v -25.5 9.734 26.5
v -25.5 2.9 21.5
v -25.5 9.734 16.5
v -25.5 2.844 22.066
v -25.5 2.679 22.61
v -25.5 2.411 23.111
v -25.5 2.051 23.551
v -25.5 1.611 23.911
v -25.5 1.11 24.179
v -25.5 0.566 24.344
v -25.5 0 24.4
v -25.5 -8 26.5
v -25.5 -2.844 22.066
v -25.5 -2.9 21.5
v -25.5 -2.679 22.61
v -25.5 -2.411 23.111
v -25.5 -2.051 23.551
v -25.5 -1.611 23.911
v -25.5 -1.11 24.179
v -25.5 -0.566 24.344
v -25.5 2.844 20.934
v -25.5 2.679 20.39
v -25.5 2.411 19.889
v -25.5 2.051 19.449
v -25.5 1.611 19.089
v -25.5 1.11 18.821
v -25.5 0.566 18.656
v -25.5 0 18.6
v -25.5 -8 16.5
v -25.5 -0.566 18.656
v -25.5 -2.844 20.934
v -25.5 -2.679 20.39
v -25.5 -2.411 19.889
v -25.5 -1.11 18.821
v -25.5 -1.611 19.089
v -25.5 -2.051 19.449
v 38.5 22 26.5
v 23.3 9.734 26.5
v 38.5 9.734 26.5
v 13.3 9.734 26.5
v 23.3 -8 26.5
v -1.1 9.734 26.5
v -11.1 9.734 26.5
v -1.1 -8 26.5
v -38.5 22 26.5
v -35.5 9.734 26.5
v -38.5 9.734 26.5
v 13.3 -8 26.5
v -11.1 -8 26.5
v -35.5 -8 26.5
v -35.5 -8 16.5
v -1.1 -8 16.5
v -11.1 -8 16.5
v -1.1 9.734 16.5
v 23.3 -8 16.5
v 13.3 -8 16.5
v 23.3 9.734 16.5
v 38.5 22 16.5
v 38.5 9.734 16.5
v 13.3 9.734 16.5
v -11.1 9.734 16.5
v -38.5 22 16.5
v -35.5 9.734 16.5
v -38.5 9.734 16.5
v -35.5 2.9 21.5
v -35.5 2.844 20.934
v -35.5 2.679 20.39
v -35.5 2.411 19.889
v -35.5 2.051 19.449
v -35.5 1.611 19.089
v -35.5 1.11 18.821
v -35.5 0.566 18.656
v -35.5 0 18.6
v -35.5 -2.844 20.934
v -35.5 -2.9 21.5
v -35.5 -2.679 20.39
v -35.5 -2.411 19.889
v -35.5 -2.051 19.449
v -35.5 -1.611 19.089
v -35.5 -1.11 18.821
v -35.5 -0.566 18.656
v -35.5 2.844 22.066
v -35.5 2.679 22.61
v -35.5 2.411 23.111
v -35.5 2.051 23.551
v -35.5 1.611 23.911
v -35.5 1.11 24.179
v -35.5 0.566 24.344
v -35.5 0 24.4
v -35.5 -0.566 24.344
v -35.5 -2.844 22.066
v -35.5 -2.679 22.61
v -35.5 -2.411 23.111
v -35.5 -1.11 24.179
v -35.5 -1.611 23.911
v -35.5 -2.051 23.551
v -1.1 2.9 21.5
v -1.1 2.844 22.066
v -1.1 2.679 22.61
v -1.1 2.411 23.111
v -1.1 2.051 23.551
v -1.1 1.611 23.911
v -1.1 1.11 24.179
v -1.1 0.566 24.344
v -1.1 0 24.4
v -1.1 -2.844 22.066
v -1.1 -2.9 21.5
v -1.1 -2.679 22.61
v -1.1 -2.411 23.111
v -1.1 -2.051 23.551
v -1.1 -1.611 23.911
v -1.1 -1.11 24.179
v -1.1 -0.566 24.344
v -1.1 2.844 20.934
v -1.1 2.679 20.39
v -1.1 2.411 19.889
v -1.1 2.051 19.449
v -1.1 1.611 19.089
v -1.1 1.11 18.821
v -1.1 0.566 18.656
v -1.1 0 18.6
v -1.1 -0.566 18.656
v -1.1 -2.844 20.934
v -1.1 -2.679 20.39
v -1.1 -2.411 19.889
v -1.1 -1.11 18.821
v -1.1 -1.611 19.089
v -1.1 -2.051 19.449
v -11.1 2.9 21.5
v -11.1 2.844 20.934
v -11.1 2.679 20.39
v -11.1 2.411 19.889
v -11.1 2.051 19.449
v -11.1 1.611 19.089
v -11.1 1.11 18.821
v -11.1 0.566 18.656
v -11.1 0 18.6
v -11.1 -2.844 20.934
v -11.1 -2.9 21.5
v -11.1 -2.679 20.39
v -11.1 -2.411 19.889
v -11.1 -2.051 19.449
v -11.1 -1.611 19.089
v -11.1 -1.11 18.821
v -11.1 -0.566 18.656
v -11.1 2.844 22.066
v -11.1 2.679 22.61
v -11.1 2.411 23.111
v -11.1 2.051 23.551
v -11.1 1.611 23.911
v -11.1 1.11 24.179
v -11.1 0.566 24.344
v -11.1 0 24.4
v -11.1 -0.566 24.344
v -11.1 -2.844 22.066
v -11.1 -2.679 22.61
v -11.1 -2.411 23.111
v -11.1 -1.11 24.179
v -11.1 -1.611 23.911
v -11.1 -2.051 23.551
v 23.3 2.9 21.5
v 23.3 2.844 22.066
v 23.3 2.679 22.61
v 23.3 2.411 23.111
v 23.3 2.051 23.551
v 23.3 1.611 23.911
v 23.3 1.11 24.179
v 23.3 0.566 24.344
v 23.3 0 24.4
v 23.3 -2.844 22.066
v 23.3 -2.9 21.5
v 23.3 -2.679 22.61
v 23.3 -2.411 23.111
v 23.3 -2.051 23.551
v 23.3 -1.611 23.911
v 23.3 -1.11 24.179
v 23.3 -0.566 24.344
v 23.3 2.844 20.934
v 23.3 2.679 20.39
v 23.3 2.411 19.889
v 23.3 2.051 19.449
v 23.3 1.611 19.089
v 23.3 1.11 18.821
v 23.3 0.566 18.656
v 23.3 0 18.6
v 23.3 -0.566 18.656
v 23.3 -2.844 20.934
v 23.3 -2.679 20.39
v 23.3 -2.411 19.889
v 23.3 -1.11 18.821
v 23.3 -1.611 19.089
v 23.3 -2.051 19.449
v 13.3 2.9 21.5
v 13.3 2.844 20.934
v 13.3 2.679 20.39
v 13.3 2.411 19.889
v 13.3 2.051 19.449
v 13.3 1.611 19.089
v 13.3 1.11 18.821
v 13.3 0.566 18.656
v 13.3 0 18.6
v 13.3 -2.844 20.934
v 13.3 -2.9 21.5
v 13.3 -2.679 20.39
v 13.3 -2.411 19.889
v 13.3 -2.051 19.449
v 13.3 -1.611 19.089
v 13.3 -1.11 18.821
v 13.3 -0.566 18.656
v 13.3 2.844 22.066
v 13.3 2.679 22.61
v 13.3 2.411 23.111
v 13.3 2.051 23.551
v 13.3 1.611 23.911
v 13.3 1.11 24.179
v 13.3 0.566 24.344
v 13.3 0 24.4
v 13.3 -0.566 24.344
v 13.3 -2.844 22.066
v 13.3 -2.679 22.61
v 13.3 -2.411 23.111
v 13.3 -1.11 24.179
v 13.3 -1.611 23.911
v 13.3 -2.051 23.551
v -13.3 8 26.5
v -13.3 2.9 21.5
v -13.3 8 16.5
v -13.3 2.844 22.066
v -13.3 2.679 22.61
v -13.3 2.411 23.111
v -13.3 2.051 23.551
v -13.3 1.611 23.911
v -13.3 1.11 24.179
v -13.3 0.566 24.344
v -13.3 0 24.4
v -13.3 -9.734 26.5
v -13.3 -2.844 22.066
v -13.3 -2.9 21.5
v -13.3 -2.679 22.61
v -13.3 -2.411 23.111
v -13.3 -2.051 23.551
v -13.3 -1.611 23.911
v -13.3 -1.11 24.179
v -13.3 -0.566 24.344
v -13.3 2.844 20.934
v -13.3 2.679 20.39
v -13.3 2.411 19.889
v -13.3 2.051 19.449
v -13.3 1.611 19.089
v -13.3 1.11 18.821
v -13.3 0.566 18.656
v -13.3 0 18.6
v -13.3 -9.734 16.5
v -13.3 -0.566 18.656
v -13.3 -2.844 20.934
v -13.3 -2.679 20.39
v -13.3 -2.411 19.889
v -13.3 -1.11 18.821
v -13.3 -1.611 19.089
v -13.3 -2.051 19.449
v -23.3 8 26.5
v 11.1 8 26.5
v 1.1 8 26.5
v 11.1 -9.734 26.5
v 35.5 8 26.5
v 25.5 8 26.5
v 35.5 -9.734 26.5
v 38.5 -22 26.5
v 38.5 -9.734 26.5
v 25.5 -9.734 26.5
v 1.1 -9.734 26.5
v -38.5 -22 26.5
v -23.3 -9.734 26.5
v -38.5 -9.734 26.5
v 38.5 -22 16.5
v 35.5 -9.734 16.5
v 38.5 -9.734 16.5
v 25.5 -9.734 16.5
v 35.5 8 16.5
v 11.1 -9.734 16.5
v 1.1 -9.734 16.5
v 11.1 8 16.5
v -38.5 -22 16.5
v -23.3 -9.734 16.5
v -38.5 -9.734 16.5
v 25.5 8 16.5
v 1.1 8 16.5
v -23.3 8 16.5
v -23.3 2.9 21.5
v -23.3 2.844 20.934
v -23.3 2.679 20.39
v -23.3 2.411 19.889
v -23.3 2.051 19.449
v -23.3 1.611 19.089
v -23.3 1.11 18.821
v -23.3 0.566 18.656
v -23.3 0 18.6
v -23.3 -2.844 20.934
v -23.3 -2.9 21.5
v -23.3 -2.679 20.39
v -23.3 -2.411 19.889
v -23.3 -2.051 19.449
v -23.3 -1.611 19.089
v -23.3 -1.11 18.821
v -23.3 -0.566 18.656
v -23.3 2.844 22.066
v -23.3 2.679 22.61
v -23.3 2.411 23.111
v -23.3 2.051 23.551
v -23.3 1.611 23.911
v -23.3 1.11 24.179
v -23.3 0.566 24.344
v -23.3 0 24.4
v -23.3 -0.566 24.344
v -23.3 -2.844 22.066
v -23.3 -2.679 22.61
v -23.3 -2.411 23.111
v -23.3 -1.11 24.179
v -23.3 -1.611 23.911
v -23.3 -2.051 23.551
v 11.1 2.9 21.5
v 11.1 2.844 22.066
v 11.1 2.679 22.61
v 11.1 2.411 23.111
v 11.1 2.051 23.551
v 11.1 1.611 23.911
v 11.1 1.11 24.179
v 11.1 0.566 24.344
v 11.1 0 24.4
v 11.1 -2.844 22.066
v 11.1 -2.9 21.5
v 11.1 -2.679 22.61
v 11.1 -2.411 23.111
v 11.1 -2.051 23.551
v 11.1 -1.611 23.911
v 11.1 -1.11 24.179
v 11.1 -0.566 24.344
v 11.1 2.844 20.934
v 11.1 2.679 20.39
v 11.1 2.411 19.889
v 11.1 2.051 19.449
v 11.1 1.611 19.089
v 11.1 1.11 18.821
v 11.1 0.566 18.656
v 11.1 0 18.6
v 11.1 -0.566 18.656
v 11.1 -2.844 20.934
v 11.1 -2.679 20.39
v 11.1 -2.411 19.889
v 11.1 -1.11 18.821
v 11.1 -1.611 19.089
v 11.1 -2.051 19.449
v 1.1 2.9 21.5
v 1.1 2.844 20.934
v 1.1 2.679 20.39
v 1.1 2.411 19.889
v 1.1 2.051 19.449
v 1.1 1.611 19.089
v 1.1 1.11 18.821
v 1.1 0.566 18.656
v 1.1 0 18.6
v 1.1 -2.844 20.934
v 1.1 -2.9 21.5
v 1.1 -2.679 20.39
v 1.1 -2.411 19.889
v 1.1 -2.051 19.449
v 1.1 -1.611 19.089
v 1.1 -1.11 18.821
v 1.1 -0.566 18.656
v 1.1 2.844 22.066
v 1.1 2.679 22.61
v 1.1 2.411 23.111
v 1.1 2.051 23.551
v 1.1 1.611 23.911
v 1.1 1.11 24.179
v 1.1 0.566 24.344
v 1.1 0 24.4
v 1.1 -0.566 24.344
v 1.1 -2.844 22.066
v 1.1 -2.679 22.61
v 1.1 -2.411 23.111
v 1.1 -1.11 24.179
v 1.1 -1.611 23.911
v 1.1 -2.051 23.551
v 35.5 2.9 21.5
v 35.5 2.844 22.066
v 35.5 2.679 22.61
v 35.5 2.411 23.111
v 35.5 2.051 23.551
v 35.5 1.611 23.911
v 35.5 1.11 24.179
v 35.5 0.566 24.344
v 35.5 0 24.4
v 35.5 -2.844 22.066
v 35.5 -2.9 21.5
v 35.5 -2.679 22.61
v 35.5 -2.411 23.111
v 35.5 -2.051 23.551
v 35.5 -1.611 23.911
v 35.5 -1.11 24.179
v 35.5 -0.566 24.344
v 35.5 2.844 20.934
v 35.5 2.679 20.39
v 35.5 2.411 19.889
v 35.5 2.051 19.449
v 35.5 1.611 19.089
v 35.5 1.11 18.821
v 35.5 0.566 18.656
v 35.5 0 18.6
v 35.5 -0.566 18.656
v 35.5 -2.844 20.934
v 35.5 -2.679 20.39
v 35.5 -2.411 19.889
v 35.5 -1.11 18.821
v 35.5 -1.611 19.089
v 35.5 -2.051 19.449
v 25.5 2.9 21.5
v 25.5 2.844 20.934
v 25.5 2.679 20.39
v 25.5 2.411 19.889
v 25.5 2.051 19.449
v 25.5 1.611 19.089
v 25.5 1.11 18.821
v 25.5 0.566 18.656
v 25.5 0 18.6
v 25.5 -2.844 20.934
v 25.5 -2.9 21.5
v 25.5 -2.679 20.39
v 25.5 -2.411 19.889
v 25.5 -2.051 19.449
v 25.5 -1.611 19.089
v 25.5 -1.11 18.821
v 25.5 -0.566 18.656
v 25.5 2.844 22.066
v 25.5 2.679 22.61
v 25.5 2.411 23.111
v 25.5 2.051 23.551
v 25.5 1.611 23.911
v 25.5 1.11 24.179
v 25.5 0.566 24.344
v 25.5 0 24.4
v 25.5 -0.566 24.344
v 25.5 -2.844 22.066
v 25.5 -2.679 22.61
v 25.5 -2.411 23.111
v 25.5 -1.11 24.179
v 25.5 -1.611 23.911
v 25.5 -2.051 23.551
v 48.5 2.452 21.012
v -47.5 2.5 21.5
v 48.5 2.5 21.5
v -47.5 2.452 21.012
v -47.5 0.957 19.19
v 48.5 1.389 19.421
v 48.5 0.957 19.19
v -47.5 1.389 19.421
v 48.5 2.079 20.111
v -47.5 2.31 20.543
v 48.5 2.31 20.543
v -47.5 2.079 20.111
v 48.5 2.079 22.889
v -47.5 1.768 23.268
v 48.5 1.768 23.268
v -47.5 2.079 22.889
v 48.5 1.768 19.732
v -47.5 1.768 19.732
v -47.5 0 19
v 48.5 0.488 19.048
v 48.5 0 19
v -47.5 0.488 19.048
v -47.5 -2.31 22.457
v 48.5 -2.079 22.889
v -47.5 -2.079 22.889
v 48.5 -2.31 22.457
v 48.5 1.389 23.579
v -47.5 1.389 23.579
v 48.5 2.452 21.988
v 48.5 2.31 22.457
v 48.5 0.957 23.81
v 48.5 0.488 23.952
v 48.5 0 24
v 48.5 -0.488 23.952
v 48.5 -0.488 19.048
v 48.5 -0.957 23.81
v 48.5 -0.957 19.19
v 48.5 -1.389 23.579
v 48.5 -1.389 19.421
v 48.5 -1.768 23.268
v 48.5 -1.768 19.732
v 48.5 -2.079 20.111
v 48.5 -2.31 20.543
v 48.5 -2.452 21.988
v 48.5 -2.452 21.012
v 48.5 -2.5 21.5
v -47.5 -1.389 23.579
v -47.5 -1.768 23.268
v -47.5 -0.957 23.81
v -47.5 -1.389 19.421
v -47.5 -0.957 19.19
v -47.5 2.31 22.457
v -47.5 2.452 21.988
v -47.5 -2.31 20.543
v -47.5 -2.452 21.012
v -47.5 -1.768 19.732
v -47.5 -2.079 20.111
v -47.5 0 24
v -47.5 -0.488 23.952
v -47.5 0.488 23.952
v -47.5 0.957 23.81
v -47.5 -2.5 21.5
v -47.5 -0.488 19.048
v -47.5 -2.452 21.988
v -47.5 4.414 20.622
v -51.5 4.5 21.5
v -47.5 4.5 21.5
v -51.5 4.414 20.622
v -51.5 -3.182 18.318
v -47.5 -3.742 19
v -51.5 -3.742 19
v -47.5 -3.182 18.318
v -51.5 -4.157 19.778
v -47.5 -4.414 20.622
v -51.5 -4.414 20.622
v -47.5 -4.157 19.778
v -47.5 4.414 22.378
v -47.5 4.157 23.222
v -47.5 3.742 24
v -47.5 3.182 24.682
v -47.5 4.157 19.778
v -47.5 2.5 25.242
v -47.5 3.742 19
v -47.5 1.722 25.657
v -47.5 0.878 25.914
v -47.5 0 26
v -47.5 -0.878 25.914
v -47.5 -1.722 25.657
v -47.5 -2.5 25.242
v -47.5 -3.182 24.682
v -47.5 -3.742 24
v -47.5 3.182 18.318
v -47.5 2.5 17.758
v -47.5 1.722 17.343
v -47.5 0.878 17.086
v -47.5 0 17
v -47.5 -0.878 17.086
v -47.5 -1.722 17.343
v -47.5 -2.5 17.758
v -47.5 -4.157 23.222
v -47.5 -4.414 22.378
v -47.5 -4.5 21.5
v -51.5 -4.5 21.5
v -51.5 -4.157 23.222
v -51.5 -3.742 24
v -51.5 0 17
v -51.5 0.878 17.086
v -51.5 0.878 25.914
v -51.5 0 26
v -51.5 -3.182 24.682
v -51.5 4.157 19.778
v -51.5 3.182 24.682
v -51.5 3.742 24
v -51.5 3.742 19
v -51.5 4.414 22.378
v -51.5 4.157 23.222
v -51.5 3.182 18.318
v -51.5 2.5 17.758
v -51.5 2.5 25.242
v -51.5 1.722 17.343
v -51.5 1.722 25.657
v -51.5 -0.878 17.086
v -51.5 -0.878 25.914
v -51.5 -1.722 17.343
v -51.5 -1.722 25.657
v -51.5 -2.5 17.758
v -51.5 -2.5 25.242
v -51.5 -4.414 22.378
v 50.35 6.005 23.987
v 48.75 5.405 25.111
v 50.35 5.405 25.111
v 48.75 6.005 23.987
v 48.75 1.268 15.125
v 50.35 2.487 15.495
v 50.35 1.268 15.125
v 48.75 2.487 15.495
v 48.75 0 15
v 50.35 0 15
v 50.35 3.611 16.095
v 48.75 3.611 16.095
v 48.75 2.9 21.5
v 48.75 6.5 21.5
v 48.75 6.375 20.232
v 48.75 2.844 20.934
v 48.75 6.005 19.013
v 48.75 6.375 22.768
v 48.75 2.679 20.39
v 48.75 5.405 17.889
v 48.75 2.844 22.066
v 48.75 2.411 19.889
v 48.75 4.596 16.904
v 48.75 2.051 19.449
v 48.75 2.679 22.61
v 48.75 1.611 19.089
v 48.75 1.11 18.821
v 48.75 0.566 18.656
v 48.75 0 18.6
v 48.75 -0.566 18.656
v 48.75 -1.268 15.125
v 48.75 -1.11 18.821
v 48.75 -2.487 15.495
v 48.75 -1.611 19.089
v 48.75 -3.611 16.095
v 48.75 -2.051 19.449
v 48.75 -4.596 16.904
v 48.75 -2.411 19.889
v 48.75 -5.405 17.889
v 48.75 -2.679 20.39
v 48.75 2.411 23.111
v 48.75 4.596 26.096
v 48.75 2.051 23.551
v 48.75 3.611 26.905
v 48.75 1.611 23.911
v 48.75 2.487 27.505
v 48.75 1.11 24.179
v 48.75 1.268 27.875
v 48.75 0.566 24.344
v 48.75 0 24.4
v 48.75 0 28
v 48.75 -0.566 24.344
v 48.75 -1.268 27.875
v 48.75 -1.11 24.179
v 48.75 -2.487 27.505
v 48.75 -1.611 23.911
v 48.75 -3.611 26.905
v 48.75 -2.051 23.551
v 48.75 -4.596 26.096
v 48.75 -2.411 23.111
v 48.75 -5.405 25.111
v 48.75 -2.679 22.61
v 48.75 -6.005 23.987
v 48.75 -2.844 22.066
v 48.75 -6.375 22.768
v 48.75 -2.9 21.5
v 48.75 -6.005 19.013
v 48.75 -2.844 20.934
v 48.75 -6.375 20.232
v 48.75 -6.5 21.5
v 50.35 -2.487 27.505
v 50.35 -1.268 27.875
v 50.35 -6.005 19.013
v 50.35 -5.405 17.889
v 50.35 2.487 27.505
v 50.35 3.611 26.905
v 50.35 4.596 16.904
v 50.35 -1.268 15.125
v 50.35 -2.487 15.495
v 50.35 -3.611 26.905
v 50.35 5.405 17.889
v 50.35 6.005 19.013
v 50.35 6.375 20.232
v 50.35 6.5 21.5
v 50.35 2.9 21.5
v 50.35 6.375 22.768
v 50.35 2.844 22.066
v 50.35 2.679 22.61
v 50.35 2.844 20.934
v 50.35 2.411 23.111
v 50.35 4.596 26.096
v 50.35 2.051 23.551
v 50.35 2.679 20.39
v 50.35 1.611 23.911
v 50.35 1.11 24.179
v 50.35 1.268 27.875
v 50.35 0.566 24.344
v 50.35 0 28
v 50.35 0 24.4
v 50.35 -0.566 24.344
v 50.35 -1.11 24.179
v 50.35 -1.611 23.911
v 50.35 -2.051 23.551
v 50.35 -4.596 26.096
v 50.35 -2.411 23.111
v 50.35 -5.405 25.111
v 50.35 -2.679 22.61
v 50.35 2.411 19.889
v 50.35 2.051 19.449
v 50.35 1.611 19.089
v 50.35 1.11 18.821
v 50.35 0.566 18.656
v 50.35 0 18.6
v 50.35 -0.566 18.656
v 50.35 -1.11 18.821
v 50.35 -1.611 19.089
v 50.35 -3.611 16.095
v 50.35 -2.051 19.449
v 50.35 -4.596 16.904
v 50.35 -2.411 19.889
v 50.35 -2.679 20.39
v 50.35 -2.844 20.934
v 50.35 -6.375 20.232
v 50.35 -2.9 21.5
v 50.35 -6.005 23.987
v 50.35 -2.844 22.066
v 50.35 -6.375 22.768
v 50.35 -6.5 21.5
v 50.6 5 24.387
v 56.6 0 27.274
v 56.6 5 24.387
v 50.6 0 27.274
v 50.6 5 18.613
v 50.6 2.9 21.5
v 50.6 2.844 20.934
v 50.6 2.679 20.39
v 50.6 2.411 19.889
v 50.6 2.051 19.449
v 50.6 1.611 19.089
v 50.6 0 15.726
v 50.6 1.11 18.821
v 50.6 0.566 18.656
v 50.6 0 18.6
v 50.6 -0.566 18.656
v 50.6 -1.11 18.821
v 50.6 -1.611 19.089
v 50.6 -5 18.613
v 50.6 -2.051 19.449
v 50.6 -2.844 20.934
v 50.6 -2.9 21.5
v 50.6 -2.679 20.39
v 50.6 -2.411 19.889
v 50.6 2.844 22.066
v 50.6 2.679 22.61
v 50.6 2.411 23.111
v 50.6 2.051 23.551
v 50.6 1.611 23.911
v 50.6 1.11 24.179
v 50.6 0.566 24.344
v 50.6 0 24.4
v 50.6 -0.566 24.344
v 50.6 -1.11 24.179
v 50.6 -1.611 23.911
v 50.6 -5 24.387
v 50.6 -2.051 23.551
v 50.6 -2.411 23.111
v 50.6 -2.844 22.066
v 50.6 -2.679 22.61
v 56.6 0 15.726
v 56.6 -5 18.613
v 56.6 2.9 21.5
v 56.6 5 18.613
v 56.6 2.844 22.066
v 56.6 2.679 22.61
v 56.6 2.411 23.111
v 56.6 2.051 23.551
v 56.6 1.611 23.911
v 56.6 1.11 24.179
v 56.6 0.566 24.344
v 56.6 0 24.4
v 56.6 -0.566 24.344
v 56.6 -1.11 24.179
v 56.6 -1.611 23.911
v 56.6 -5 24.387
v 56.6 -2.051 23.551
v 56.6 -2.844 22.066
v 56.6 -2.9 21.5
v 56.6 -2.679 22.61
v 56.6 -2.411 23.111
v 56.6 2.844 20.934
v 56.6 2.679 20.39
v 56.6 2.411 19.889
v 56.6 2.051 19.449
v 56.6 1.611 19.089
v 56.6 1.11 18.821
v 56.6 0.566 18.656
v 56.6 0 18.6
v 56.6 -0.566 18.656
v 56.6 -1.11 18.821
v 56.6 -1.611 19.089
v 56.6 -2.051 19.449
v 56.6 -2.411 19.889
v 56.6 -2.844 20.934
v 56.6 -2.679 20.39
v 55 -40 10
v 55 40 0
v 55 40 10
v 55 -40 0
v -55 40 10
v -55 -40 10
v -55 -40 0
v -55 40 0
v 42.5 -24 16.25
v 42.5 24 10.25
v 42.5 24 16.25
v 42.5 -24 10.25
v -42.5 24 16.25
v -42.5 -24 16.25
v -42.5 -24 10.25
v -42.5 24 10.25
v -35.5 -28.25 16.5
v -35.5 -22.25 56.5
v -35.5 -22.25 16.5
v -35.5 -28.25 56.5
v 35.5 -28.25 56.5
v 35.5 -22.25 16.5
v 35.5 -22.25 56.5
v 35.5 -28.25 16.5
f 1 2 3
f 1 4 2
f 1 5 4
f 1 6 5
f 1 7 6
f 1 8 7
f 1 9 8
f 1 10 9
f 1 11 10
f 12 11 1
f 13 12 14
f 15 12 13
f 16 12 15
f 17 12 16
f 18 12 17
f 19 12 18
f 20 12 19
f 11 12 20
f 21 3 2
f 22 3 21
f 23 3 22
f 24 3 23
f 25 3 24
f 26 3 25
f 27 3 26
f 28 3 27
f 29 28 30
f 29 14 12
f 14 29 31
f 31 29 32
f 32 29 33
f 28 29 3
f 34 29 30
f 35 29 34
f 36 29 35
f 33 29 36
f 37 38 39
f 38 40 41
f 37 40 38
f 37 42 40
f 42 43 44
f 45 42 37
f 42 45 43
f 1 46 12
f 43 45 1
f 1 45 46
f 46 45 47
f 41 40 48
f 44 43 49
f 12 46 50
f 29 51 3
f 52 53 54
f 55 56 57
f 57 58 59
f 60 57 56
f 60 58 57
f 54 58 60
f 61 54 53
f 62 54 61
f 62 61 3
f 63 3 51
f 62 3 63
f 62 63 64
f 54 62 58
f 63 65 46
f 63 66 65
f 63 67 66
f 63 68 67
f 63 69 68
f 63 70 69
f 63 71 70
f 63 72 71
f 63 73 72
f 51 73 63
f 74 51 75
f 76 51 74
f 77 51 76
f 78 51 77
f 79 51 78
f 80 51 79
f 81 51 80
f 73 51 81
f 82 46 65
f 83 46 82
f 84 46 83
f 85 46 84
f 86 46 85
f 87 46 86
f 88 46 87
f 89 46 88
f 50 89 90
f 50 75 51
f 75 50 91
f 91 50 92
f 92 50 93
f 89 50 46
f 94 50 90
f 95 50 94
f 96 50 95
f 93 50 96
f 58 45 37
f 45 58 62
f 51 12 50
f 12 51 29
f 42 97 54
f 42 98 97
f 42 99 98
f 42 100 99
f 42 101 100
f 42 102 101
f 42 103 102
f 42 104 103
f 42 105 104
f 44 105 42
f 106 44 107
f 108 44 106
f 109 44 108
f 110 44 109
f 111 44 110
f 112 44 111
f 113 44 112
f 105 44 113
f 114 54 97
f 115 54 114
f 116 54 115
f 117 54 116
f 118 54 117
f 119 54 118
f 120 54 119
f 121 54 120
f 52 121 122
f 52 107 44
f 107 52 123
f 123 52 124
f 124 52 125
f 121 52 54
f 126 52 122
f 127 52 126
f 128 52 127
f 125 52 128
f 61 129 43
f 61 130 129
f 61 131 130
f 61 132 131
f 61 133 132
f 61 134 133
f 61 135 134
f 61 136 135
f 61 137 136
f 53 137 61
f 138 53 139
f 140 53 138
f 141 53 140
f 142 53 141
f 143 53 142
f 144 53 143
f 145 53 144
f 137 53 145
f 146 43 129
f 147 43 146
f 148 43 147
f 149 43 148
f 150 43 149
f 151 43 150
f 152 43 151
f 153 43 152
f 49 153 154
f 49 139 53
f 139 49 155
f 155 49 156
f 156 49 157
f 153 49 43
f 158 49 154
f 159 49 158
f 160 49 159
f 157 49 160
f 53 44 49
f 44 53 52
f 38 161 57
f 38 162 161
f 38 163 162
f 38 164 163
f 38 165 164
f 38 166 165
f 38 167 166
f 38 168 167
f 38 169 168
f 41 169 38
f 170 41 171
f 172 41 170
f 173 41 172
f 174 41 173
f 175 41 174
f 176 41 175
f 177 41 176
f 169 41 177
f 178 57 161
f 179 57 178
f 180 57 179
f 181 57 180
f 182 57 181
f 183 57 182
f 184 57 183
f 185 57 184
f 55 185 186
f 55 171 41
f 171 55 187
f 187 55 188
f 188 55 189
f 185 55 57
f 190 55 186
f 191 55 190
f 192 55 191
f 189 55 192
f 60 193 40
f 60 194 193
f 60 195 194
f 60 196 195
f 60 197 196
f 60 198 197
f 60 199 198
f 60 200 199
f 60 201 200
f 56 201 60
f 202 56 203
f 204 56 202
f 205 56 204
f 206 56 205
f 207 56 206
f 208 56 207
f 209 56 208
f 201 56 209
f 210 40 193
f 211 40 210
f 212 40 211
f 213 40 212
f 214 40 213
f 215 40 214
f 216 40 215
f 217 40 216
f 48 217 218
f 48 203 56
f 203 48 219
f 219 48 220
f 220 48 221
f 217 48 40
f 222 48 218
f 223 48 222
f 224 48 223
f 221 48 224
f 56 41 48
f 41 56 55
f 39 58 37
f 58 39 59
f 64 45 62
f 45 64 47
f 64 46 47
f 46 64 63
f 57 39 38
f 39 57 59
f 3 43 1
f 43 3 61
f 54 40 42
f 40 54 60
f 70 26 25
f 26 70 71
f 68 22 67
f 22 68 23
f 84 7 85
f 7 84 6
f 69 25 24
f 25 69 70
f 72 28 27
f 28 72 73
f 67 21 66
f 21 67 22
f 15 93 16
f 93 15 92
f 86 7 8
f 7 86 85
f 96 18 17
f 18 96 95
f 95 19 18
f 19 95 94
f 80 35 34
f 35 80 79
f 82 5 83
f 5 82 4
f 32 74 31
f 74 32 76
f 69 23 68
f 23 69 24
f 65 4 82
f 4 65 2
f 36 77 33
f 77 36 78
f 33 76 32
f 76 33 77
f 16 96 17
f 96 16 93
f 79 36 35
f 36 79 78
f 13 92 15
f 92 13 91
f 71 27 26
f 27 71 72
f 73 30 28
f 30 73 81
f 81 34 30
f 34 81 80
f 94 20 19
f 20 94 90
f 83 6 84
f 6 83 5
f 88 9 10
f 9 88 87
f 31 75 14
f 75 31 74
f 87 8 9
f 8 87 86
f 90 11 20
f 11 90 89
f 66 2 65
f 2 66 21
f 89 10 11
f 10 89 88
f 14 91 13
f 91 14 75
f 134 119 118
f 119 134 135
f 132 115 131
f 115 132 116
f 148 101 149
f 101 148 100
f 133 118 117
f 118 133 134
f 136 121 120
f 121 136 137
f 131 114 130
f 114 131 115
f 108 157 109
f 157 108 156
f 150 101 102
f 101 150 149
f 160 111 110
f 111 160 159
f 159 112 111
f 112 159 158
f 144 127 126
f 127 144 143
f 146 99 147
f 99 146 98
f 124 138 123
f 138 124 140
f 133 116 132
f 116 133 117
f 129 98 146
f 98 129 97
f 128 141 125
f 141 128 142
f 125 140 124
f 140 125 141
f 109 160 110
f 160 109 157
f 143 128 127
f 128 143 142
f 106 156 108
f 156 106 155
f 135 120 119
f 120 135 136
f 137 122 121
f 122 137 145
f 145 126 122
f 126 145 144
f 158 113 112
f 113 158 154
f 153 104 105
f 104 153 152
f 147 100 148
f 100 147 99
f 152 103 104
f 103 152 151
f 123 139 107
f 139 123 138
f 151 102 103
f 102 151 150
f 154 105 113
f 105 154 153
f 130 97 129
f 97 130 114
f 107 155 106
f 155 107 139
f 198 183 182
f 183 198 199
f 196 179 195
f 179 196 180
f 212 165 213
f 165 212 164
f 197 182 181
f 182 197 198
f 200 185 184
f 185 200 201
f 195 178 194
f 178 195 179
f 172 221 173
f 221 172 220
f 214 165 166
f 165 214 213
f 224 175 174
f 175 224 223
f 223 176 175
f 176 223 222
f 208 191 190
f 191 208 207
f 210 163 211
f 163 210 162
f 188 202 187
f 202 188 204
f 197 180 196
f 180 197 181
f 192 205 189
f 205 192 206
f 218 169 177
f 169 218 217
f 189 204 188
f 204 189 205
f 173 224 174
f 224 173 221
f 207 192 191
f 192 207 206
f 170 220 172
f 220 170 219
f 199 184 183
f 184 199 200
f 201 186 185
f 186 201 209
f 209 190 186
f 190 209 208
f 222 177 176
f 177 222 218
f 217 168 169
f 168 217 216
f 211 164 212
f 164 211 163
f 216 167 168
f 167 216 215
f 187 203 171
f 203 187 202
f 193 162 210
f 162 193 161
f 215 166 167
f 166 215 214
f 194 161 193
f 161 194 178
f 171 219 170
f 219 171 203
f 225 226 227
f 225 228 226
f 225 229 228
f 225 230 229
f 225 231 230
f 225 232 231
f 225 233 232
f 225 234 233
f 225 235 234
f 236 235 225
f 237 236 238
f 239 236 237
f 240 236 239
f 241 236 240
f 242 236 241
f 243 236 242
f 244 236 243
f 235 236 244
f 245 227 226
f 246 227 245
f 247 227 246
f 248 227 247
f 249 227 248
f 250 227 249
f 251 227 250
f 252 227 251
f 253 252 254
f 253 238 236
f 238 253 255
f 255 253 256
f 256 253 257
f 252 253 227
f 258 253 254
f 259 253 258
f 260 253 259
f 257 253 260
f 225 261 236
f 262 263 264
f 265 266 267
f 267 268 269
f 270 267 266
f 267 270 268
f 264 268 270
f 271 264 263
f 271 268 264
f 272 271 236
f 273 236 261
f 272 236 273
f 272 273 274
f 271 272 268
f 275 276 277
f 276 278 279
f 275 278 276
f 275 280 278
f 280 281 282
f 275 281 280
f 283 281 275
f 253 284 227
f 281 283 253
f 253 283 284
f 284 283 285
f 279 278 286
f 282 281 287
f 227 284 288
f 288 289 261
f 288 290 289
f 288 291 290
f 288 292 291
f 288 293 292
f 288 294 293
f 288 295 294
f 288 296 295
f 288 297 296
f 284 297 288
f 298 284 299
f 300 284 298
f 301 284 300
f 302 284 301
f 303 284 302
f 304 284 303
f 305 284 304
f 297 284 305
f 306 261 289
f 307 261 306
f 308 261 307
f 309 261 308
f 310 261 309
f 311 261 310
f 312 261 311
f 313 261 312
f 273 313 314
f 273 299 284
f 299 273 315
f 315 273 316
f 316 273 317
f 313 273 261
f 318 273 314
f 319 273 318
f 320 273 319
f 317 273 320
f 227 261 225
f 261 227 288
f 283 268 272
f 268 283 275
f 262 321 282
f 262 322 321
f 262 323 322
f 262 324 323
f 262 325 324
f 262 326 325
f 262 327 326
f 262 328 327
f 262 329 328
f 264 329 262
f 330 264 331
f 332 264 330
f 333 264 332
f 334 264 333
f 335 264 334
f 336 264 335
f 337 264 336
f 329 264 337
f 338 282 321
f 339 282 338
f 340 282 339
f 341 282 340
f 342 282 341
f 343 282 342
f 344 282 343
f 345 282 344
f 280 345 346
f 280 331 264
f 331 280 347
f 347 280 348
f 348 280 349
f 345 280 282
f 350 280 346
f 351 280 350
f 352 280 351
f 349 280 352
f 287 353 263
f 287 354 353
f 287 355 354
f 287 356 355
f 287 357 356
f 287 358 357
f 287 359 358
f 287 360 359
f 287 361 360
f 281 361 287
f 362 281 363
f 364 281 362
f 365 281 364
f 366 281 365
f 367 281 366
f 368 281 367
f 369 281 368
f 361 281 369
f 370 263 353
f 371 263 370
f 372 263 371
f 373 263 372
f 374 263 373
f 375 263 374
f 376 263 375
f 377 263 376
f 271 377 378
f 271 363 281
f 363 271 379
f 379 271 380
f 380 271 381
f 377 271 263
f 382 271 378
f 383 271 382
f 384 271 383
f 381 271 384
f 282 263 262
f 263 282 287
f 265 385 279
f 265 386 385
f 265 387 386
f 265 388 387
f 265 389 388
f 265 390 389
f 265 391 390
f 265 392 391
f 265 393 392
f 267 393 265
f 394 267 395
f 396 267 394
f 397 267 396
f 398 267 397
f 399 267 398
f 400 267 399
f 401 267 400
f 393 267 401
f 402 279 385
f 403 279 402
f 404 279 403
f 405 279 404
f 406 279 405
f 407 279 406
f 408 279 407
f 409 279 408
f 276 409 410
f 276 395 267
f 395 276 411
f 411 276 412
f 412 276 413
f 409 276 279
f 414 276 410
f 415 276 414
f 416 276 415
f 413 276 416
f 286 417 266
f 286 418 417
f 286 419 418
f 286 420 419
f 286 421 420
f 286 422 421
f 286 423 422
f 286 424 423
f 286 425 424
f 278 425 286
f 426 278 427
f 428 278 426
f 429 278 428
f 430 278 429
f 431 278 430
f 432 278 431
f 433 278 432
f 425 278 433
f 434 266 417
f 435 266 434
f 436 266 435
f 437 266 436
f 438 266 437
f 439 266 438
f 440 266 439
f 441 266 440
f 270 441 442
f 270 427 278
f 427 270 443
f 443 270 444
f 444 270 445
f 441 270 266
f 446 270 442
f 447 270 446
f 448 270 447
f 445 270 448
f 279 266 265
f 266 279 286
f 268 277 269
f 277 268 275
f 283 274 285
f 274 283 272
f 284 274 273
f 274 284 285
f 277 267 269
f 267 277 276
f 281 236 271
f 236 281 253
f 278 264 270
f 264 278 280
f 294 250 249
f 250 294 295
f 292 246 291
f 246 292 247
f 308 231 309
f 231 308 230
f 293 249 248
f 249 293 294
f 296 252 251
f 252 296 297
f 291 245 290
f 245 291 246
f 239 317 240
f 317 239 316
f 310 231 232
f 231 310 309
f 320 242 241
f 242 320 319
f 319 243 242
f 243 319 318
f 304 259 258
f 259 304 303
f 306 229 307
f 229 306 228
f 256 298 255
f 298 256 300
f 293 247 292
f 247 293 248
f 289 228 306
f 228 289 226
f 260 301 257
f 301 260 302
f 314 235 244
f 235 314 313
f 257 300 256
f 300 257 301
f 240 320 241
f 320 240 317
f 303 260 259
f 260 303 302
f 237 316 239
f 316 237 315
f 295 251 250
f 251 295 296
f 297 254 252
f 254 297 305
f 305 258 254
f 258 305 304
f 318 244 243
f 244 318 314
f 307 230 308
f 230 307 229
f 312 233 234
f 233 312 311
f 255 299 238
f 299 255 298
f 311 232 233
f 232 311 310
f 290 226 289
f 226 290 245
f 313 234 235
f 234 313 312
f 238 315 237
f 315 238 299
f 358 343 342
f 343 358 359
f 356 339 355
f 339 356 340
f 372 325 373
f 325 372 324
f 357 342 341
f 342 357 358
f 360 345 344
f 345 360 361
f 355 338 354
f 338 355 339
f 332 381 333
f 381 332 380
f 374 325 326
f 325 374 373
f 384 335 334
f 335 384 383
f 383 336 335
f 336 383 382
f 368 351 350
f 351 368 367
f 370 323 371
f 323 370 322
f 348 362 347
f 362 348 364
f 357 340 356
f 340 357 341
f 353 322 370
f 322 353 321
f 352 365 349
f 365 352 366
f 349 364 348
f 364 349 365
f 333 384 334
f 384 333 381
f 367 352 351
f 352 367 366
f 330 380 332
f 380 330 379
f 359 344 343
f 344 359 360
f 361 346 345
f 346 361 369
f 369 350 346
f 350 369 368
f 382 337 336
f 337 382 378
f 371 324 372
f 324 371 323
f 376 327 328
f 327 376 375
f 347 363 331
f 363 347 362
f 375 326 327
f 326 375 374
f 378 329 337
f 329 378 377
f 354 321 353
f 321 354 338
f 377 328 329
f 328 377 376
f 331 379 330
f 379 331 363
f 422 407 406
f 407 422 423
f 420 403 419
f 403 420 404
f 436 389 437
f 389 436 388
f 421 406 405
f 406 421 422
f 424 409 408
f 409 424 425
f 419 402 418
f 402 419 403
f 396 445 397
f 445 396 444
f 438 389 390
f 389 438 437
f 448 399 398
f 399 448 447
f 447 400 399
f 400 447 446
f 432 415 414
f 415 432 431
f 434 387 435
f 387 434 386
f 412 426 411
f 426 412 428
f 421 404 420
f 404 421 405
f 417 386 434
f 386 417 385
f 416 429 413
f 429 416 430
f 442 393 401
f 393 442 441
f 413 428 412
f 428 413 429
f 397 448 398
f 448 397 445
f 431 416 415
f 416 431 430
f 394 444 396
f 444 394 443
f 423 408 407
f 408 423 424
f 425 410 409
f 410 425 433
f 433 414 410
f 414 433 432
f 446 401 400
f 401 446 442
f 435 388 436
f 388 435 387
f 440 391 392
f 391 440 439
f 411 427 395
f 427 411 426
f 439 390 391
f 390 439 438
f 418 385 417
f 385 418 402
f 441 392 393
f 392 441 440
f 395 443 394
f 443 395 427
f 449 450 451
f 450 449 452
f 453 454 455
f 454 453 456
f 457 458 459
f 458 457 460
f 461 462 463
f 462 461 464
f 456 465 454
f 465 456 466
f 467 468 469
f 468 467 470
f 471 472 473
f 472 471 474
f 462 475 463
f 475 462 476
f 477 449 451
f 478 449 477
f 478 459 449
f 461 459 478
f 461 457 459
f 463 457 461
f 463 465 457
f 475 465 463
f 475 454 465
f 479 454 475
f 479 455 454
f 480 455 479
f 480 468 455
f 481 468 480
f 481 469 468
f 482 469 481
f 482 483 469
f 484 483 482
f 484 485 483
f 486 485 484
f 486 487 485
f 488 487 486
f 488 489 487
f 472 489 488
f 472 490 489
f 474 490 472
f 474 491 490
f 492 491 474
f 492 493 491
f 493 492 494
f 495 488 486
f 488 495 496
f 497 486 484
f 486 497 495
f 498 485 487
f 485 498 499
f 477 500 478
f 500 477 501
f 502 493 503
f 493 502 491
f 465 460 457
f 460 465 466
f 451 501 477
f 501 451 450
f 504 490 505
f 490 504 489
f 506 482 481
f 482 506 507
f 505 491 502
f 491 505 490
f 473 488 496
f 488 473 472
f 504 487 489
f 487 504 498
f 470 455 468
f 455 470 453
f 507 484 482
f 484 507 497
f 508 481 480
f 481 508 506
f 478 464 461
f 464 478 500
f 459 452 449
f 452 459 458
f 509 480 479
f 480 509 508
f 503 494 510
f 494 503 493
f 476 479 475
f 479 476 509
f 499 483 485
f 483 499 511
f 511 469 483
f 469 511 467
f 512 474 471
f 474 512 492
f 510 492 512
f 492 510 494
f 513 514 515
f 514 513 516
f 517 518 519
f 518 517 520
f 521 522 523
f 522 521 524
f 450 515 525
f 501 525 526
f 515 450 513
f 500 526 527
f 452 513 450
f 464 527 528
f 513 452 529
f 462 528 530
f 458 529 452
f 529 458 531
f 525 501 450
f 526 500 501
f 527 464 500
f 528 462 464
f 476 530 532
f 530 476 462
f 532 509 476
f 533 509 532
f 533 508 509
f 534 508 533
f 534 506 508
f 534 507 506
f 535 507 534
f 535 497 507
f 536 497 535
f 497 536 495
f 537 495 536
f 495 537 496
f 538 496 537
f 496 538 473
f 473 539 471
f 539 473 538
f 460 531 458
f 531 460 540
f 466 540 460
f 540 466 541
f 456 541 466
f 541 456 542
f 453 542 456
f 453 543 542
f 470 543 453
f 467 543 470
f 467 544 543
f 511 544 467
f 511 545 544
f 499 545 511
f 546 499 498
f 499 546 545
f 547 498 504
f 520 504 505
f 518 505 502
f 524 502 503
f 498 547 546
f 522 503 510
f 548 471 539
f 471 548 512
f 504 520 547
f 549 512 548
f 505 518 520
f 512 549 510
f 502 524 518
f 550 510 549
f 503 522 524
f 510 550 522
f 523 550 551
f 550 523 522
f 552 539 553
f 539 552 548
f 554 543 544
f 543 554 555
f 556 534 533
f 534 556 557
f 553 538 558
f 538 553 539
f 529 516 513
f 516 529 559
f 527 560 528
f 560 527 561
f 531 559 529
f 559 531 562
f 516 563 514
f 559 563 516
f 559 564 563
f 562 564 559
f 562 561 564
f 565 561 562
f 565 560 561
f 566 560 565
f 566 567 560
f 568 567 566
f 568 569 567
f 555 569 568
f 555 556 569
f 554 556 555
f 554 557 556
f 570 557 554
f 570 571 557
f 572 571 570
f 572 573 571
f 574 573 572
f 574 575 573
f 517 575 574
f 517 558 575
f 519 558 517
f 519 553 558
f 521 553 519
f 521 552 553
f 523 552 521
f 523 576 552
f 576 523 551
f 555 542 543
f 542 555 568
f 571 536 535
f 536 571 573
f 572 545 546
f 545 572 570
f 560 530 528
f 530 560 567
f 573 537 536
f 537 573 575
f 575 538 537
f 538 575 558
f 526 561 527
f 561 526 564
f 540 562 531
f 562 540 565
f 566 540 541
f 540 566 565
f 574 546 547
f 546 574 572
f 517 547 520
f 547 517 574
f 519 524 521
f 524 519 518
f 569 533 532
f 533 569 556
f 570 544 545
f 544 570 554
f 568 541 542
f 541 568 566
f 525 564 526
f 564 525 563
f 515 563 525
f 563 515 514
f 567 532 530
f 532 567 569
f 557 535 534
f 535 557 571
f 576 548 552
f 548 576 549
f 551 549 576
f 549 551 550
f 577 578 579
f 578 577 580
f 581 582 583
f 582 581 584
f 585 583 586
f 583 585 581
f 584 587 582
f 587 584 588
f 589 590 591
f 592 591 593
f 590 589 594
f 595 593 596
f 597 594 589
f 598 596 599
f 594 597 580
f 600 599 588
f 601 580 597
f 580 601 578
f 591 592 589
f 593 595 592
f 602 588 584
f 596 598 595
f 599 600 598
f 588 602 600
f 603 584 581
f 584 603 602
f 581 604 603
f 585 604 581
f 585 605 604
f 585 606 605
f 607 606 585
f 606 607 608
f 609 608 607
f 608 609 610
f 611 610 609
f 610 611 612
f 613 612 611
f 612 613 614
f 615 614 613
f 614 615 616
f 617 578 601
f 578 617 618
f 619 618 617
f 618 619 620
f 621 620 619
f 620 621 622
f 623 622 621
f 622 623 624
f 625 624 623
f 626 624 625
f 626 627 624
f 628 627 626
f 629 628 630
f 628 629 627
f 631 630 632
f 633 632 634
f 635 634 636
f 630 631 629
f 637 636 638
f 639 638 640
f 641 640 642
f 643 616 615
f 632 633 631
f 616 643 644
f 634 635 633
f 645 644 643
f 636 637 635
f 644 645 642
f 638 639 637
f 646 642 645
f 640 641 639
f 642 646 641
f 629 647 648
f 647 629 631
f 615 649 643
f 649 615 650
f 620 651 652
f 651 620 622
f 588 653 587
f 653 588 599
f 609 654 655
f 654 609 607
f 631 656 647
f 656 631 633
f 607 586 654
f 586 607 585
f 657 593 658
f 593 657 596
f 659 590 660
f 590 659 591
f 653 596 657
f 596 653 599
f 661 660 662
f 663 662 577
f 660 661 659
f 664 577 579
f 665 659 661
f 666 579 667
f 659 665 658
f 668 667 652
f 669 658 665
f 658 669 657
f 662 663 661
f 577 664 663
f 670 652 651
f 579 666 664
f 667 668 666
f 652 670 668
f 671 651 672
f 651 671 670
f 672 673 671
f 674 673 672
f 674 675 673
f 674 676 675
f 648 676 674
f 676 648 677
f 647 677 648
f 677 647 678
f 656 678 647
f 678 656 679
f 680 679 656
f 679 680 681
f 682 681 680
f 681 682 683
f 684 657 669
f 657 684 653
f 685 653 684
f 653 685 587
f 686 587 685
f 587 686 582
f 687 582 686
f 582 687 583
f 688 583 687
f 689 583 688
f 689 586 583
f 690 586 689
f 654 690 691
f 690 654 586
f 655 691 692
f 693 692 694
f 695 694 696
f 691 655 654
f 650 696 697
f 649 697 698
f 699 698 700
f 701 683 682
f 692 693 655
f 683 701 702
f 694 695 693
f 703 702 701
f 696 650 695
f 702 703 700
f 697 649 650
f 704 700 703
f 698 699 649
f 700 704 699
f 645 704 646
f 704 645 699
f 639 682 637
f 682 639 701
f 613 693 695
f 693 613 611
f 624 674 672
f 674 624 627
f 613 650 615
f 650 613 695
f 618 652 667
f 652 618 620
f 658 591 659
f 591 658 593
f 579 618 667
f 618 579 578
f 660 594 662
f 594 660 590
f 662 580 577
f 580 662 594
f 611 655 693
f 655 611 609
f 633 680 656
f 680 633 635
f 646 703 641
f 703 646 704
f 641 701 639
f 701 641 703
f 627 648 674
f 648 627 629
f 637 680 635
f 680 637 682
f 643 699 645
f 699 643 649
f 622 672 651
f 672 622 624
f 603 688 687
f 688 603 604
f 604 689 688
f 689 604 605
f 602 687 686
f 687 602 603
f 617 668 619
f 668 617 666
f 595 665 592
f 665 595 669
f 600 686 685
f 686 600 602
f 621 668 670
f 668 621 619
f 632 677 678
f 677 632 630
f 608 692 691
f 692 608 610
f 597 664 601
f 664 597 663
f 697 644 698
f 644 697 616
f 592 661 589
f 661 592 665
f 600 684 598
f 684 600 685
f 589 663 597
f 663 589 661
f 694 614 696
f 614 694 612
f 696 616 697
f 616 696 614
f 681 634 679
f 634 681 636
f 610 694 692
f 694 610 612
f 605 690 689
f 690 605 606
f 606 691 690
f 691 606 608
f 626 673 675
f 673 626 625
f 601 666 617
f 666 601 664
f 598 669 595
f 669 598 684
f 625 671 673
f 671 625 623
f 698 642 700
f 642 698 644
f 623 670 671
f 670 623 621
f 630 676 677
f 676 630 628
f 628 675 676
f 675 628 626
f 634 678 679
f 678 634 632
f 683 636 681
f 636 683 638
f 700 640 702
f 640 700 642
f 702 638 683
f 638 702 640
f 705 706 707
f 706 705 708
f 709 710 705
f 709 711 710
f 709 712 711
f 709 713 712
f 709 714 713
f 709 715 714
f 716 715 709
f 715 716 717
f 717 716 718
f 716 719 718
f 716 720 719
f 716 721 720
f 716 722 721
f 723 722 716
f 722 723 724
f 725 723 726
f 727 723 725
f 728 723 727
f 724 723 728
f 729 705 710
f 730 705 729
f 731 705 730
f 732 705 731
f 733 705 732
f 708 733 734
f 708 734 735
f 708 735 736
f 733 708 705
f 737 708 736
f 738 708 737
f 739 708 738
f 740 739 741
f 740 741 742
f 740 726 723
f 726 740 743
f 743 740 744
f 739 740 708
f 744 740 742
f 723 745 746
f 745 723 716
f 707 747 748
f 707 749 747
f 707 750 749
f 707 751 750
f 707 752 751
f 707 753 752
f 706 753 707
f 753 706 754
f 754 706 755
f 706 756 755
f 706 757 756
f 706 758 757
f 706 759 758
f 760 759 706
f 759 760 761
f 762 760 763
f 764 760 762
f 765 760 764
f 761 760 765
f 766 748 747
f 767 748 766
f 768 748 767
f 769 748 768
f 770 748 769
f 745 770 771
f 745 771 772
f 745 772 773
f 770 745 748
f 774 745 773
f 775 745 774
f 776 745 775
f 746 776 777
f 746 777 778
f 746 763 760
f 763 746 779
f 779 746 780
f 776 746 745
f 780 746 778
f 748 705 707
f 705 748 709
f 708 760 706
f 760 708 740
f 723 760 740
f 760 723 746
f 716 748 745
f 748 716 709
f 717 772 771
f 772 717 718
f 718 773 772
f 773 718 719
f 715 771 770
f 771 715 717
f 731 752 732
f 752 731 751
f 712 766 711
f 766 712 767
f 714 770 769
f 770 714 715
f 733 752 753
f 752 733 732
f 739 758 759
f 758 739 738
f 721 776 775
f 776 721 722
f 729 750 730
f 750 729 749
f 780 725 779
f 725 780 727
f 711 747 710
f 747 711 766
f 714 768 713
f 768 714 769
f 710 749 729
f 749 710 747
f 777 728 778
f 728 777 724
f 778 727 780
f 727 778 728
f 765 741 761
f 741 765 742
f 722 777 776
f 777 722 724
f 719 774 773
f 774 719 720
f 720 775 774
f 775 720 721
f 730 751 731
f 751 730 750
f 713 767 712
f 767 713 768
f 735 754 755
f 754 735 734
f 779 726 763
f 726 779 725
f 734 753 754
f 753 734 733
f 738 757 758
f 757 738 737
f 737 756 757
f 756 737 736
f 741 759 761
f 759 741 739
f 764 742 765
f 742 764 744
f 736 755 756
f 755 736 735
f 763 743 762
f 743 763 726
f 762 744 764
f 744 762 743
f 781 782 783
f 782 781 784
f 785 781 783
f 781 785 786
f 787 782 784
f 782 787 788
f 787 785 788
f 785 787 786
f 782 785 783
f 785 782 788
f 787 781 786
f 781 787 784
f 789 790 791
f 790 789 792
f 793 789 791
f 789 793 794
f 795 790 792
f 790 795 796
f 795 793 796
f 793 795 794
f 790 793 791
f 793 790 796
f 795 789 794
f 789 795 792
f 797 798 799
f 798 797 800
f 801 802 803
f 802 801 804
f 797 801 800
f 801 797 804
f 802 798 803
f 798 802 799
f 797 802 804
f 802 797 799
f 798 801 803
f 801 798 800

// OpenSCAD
$fn = 32;

// ------------------------------------------------------------------------
// Comb hinge with flap: leaf 77 x 22 mm, pin d5, flap 40 mm
// Every part is its own module, assembly() places every instance.
// ------------------------------------------------------------------------

// --- part 1 ---
module hinge_bed() {
  difference() {
    translate([-55, -40, 0]) cube([110, 80, 10]);
  }
}

// --- part 2 ---
module hinge_riser() {
  difference() {
    translate([-42.5, -24, 0]) cube([85, 48, 6]);
  }
}

// --- part 3 ---
module hinge_leaf_a() {
  difference() {
    union() {
      translate([-35.5, -8, -5]) cube([10, 30, 10]);
      translate([-11.1, -8, -5]) cube([10, 30, 10]);
      translate([13.3, -8, -5]) cube([10, 30, 10]);
      translate([-38.5, 9.734, -5]) cube([77, 12.266, 10]);
    }
    translate([-30.5, 0, 0]) rotate([0, 90, 0]) cylinder(h = 12, d = 5.8, center = true);
    translate([-6.1, 0, 0]) rotate([0, 90, 0]) cylinder(h = 12, d = 5.8, center = true);
    translate([18.3, 0, 0]) rotate([0, 90, 0]) cylinder(h = 12, d = 5.8, center = true);
  }
}

// --- part 4 ---
module hinge_leaf_b() {
  difference() {
    union() {
      translate([-23.3, -22, -5]) cube([10, 30, 10]);
      translate([1.1, -22, -5]) cube([10, 30, 10]);
      translate([25.5, -22, -5]) cube([10, 30, 10]);
      translate([-38.5, -22, -5]) cube([77, 12.266, 10]);
    }
    translate([-18.3, 0, 0]) rotate([0, 90, 0]) cylinder(h = 12, d = 5.8, center = true);
    translate([6.1, 0, 0]) rotate([0, 90, 0]) cylinder(h = 12, d = 5.8, center = true);
    translate([30.5, 0, 0]) rotate([0, 90, 0]) cylinder(h = 12, d = 5.8, center = true);
  }
}

// --- part 5 ---
module hinge_flap() {
  difference() {
    translate([-35.5, -20, 0]) cube([71, 40, 6]);
  }
}

// --- part 6 ---
module hinge_pin() {
  rotate([0, 90, 0]) cylinder(h = 97, d = 5, center = true);
  translate([-51.5, 0, 0]) rotate([0, 90, 0]) cylinder(h = 4, d = 9);
}

// --- part 7 ---
module pin_washer() {
  difference() {
      translate([0, 0, 0]) cylinder(h = 1.6, d = 13);
      translate([0, 0, -1]) cylinder(h = 3.6, d = 5.8);
    }
}

// --- part 8 ---
module pin_nut() {
  difference() {
    linear_extrude(height = 6) polygon(points = [[5.774, 0], [2.887, 5], [-2.887, 5], [-5.774, 0], [-2.887, -5], [2.887, -5]]);
    translate([0, 0, -1]) cylinder(h = 8, d = 5.8);
  }
}

// --- assembly ---
module assembly() {
  color([0.80, 0.24, 0.20]) translate([0, 0, 0]) rotate([0, 0, 0]) hinge_bed();
  color([0.20, 0.45, 0.75]) translate([0, 0, 10.25]) rotate([0, 0, 0]) hinge_riser();
  color([0.25, 0.62, 0.32]) translate([0, 0, 21.5]) rotate([0, 0, 0]) hinge_leaf_a();
  color([0.92, 0.70, 0.18]) translate([0, 0, 21.5]) rotate([0, 0, 0]) hinge_leaf_b();
  color([0.58, 0.35, 0.70]) translate([0, -22.25, 36.5]) rotate([90, 0, 0]) hinge_flap();
  color([0.16, 0.66, 0.66]) translate([0, 0, 21.5]) rotate([0, 0, 0]) hinge_pin();
  color([0.85, 0.48, 0.18]) translate([48.75, 0, 21.5]) rotate([0, 90, 0]) pin_washer();
  color([0.55, 0.60, 0.65]) translate([50.6, 0, 21.5]) rotate([0, 90, 0]) pin_nut();
}

assembly();
